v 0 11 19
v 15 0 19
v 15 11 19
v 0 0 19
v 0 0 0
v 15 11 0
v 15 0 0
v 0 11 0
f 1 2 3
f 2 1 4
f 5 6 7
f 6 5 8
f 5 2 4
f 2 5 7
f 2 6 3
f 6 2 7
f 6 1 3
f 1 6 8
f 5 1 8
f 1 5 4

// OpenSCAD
// Generated by SolidPython 1.0.1 on 2020-07-29 00:46:55


cube(size = [15, 11, 19]);
/***********************************************
*********      SolidPython code:      **********
************************************************
 
# import packages: SolidPython
from solid import *
from solid.utils import *
from itertools import chain, combinations, permutations


class Resize:

    def __init__(self, scad_file):
        self.scad_file = scad_file
        #self.scad_file = import_scad(scad_file)
        # cone/cylinder param:
        self.r1 = 0
        self.r2 = 0
        self.h = 0
        # rectangular prism param:
        self.w = 0
        self.l = 0
        # ellipse param:
        self.r = 0

    # import OpenScad code (file name corresponds to shape)


    # classify shape + parameters
    def assign(self, param1, param2, param3):
        if self.scad_file == 'cone.scad':
            self.r1 = param1
            self.r2 = param2
            self.h = param3
        elif self.scad_file == 'cylinder.scad':
            self.r1 = param1
            self.r2 = param2
            self.h = param3
        elif self.scad_file == 'rectangularPrism.scad':
            self.h = param1
            self.l = param2
            self.w = param3
        else:
            self.r = param1
            self.h = param2

    # resize parameters
    def iterate(self):
        x = range(3, 20, 2)
        i = 1
        if self.scad_file == 'cone.scad':
            tempList = list(permutations(x, 2))
            for temp in tempList:
                param1 = temp[0]
                param2 = temp[1]
                filepath = 'produced_scad_files/' + 'cone' + str(param1) + '_' + str(param2) + '_' + '.scad'
                scad_render_to_file(cylinder(h=param1, r1=param2, r2=0), filepath)

        elif self.scad_file == 'cylinder.scad':
            tempList = list(permutations(x, 3))
            for temp in tempList:
                param1 = temp[0]
                param2 = temp[1]
                filepath = 'produced_scad_files/' + 'cylinder' + str(param1) + '_' + str(param2) + '_' + '.scad'
                scad_render_to_file(cylinder(h=param1, r1=param2, r2=param2), filepath)

        elif self.scad_file == 'rectangularPrism.scad':
            tempList = list(permutations(x, 3))
            for temp in tempList:
                param1 = temp[0]
                param2 = temp[1]
                param3 = temp[2]
                filepath = 'produced_scad_files/' + 'rectangularPrism' + str(param1) + '_' + str(param2) + '_' + str(
                    param3) + '.scad'
                scad_render_to_file(cube(size=(param1, param2, param3)), filepath)

        elif self.scad_file == 'ellipse.scad':
            tempList = list(permutations(x, 4))
            for temp in tempList:
                param1 = temp[0]
                param2 = temp[1]
                param3 = temp[2]
                param4 = temp[3]
                filepath = 'produced_scad_files/' + 'ellipse' + str(param1) + '_' + str(param2) + '_' + str(param3) + '_' + str(param4) + '.scad'
                scad_render_to_file(scale([param1, param2, param3])(sphere(r=param4)), filepath)

    def render_to_scadfile(self):
        scad_render_to_file(scad, 'example.scad') 
 
************************************************/
